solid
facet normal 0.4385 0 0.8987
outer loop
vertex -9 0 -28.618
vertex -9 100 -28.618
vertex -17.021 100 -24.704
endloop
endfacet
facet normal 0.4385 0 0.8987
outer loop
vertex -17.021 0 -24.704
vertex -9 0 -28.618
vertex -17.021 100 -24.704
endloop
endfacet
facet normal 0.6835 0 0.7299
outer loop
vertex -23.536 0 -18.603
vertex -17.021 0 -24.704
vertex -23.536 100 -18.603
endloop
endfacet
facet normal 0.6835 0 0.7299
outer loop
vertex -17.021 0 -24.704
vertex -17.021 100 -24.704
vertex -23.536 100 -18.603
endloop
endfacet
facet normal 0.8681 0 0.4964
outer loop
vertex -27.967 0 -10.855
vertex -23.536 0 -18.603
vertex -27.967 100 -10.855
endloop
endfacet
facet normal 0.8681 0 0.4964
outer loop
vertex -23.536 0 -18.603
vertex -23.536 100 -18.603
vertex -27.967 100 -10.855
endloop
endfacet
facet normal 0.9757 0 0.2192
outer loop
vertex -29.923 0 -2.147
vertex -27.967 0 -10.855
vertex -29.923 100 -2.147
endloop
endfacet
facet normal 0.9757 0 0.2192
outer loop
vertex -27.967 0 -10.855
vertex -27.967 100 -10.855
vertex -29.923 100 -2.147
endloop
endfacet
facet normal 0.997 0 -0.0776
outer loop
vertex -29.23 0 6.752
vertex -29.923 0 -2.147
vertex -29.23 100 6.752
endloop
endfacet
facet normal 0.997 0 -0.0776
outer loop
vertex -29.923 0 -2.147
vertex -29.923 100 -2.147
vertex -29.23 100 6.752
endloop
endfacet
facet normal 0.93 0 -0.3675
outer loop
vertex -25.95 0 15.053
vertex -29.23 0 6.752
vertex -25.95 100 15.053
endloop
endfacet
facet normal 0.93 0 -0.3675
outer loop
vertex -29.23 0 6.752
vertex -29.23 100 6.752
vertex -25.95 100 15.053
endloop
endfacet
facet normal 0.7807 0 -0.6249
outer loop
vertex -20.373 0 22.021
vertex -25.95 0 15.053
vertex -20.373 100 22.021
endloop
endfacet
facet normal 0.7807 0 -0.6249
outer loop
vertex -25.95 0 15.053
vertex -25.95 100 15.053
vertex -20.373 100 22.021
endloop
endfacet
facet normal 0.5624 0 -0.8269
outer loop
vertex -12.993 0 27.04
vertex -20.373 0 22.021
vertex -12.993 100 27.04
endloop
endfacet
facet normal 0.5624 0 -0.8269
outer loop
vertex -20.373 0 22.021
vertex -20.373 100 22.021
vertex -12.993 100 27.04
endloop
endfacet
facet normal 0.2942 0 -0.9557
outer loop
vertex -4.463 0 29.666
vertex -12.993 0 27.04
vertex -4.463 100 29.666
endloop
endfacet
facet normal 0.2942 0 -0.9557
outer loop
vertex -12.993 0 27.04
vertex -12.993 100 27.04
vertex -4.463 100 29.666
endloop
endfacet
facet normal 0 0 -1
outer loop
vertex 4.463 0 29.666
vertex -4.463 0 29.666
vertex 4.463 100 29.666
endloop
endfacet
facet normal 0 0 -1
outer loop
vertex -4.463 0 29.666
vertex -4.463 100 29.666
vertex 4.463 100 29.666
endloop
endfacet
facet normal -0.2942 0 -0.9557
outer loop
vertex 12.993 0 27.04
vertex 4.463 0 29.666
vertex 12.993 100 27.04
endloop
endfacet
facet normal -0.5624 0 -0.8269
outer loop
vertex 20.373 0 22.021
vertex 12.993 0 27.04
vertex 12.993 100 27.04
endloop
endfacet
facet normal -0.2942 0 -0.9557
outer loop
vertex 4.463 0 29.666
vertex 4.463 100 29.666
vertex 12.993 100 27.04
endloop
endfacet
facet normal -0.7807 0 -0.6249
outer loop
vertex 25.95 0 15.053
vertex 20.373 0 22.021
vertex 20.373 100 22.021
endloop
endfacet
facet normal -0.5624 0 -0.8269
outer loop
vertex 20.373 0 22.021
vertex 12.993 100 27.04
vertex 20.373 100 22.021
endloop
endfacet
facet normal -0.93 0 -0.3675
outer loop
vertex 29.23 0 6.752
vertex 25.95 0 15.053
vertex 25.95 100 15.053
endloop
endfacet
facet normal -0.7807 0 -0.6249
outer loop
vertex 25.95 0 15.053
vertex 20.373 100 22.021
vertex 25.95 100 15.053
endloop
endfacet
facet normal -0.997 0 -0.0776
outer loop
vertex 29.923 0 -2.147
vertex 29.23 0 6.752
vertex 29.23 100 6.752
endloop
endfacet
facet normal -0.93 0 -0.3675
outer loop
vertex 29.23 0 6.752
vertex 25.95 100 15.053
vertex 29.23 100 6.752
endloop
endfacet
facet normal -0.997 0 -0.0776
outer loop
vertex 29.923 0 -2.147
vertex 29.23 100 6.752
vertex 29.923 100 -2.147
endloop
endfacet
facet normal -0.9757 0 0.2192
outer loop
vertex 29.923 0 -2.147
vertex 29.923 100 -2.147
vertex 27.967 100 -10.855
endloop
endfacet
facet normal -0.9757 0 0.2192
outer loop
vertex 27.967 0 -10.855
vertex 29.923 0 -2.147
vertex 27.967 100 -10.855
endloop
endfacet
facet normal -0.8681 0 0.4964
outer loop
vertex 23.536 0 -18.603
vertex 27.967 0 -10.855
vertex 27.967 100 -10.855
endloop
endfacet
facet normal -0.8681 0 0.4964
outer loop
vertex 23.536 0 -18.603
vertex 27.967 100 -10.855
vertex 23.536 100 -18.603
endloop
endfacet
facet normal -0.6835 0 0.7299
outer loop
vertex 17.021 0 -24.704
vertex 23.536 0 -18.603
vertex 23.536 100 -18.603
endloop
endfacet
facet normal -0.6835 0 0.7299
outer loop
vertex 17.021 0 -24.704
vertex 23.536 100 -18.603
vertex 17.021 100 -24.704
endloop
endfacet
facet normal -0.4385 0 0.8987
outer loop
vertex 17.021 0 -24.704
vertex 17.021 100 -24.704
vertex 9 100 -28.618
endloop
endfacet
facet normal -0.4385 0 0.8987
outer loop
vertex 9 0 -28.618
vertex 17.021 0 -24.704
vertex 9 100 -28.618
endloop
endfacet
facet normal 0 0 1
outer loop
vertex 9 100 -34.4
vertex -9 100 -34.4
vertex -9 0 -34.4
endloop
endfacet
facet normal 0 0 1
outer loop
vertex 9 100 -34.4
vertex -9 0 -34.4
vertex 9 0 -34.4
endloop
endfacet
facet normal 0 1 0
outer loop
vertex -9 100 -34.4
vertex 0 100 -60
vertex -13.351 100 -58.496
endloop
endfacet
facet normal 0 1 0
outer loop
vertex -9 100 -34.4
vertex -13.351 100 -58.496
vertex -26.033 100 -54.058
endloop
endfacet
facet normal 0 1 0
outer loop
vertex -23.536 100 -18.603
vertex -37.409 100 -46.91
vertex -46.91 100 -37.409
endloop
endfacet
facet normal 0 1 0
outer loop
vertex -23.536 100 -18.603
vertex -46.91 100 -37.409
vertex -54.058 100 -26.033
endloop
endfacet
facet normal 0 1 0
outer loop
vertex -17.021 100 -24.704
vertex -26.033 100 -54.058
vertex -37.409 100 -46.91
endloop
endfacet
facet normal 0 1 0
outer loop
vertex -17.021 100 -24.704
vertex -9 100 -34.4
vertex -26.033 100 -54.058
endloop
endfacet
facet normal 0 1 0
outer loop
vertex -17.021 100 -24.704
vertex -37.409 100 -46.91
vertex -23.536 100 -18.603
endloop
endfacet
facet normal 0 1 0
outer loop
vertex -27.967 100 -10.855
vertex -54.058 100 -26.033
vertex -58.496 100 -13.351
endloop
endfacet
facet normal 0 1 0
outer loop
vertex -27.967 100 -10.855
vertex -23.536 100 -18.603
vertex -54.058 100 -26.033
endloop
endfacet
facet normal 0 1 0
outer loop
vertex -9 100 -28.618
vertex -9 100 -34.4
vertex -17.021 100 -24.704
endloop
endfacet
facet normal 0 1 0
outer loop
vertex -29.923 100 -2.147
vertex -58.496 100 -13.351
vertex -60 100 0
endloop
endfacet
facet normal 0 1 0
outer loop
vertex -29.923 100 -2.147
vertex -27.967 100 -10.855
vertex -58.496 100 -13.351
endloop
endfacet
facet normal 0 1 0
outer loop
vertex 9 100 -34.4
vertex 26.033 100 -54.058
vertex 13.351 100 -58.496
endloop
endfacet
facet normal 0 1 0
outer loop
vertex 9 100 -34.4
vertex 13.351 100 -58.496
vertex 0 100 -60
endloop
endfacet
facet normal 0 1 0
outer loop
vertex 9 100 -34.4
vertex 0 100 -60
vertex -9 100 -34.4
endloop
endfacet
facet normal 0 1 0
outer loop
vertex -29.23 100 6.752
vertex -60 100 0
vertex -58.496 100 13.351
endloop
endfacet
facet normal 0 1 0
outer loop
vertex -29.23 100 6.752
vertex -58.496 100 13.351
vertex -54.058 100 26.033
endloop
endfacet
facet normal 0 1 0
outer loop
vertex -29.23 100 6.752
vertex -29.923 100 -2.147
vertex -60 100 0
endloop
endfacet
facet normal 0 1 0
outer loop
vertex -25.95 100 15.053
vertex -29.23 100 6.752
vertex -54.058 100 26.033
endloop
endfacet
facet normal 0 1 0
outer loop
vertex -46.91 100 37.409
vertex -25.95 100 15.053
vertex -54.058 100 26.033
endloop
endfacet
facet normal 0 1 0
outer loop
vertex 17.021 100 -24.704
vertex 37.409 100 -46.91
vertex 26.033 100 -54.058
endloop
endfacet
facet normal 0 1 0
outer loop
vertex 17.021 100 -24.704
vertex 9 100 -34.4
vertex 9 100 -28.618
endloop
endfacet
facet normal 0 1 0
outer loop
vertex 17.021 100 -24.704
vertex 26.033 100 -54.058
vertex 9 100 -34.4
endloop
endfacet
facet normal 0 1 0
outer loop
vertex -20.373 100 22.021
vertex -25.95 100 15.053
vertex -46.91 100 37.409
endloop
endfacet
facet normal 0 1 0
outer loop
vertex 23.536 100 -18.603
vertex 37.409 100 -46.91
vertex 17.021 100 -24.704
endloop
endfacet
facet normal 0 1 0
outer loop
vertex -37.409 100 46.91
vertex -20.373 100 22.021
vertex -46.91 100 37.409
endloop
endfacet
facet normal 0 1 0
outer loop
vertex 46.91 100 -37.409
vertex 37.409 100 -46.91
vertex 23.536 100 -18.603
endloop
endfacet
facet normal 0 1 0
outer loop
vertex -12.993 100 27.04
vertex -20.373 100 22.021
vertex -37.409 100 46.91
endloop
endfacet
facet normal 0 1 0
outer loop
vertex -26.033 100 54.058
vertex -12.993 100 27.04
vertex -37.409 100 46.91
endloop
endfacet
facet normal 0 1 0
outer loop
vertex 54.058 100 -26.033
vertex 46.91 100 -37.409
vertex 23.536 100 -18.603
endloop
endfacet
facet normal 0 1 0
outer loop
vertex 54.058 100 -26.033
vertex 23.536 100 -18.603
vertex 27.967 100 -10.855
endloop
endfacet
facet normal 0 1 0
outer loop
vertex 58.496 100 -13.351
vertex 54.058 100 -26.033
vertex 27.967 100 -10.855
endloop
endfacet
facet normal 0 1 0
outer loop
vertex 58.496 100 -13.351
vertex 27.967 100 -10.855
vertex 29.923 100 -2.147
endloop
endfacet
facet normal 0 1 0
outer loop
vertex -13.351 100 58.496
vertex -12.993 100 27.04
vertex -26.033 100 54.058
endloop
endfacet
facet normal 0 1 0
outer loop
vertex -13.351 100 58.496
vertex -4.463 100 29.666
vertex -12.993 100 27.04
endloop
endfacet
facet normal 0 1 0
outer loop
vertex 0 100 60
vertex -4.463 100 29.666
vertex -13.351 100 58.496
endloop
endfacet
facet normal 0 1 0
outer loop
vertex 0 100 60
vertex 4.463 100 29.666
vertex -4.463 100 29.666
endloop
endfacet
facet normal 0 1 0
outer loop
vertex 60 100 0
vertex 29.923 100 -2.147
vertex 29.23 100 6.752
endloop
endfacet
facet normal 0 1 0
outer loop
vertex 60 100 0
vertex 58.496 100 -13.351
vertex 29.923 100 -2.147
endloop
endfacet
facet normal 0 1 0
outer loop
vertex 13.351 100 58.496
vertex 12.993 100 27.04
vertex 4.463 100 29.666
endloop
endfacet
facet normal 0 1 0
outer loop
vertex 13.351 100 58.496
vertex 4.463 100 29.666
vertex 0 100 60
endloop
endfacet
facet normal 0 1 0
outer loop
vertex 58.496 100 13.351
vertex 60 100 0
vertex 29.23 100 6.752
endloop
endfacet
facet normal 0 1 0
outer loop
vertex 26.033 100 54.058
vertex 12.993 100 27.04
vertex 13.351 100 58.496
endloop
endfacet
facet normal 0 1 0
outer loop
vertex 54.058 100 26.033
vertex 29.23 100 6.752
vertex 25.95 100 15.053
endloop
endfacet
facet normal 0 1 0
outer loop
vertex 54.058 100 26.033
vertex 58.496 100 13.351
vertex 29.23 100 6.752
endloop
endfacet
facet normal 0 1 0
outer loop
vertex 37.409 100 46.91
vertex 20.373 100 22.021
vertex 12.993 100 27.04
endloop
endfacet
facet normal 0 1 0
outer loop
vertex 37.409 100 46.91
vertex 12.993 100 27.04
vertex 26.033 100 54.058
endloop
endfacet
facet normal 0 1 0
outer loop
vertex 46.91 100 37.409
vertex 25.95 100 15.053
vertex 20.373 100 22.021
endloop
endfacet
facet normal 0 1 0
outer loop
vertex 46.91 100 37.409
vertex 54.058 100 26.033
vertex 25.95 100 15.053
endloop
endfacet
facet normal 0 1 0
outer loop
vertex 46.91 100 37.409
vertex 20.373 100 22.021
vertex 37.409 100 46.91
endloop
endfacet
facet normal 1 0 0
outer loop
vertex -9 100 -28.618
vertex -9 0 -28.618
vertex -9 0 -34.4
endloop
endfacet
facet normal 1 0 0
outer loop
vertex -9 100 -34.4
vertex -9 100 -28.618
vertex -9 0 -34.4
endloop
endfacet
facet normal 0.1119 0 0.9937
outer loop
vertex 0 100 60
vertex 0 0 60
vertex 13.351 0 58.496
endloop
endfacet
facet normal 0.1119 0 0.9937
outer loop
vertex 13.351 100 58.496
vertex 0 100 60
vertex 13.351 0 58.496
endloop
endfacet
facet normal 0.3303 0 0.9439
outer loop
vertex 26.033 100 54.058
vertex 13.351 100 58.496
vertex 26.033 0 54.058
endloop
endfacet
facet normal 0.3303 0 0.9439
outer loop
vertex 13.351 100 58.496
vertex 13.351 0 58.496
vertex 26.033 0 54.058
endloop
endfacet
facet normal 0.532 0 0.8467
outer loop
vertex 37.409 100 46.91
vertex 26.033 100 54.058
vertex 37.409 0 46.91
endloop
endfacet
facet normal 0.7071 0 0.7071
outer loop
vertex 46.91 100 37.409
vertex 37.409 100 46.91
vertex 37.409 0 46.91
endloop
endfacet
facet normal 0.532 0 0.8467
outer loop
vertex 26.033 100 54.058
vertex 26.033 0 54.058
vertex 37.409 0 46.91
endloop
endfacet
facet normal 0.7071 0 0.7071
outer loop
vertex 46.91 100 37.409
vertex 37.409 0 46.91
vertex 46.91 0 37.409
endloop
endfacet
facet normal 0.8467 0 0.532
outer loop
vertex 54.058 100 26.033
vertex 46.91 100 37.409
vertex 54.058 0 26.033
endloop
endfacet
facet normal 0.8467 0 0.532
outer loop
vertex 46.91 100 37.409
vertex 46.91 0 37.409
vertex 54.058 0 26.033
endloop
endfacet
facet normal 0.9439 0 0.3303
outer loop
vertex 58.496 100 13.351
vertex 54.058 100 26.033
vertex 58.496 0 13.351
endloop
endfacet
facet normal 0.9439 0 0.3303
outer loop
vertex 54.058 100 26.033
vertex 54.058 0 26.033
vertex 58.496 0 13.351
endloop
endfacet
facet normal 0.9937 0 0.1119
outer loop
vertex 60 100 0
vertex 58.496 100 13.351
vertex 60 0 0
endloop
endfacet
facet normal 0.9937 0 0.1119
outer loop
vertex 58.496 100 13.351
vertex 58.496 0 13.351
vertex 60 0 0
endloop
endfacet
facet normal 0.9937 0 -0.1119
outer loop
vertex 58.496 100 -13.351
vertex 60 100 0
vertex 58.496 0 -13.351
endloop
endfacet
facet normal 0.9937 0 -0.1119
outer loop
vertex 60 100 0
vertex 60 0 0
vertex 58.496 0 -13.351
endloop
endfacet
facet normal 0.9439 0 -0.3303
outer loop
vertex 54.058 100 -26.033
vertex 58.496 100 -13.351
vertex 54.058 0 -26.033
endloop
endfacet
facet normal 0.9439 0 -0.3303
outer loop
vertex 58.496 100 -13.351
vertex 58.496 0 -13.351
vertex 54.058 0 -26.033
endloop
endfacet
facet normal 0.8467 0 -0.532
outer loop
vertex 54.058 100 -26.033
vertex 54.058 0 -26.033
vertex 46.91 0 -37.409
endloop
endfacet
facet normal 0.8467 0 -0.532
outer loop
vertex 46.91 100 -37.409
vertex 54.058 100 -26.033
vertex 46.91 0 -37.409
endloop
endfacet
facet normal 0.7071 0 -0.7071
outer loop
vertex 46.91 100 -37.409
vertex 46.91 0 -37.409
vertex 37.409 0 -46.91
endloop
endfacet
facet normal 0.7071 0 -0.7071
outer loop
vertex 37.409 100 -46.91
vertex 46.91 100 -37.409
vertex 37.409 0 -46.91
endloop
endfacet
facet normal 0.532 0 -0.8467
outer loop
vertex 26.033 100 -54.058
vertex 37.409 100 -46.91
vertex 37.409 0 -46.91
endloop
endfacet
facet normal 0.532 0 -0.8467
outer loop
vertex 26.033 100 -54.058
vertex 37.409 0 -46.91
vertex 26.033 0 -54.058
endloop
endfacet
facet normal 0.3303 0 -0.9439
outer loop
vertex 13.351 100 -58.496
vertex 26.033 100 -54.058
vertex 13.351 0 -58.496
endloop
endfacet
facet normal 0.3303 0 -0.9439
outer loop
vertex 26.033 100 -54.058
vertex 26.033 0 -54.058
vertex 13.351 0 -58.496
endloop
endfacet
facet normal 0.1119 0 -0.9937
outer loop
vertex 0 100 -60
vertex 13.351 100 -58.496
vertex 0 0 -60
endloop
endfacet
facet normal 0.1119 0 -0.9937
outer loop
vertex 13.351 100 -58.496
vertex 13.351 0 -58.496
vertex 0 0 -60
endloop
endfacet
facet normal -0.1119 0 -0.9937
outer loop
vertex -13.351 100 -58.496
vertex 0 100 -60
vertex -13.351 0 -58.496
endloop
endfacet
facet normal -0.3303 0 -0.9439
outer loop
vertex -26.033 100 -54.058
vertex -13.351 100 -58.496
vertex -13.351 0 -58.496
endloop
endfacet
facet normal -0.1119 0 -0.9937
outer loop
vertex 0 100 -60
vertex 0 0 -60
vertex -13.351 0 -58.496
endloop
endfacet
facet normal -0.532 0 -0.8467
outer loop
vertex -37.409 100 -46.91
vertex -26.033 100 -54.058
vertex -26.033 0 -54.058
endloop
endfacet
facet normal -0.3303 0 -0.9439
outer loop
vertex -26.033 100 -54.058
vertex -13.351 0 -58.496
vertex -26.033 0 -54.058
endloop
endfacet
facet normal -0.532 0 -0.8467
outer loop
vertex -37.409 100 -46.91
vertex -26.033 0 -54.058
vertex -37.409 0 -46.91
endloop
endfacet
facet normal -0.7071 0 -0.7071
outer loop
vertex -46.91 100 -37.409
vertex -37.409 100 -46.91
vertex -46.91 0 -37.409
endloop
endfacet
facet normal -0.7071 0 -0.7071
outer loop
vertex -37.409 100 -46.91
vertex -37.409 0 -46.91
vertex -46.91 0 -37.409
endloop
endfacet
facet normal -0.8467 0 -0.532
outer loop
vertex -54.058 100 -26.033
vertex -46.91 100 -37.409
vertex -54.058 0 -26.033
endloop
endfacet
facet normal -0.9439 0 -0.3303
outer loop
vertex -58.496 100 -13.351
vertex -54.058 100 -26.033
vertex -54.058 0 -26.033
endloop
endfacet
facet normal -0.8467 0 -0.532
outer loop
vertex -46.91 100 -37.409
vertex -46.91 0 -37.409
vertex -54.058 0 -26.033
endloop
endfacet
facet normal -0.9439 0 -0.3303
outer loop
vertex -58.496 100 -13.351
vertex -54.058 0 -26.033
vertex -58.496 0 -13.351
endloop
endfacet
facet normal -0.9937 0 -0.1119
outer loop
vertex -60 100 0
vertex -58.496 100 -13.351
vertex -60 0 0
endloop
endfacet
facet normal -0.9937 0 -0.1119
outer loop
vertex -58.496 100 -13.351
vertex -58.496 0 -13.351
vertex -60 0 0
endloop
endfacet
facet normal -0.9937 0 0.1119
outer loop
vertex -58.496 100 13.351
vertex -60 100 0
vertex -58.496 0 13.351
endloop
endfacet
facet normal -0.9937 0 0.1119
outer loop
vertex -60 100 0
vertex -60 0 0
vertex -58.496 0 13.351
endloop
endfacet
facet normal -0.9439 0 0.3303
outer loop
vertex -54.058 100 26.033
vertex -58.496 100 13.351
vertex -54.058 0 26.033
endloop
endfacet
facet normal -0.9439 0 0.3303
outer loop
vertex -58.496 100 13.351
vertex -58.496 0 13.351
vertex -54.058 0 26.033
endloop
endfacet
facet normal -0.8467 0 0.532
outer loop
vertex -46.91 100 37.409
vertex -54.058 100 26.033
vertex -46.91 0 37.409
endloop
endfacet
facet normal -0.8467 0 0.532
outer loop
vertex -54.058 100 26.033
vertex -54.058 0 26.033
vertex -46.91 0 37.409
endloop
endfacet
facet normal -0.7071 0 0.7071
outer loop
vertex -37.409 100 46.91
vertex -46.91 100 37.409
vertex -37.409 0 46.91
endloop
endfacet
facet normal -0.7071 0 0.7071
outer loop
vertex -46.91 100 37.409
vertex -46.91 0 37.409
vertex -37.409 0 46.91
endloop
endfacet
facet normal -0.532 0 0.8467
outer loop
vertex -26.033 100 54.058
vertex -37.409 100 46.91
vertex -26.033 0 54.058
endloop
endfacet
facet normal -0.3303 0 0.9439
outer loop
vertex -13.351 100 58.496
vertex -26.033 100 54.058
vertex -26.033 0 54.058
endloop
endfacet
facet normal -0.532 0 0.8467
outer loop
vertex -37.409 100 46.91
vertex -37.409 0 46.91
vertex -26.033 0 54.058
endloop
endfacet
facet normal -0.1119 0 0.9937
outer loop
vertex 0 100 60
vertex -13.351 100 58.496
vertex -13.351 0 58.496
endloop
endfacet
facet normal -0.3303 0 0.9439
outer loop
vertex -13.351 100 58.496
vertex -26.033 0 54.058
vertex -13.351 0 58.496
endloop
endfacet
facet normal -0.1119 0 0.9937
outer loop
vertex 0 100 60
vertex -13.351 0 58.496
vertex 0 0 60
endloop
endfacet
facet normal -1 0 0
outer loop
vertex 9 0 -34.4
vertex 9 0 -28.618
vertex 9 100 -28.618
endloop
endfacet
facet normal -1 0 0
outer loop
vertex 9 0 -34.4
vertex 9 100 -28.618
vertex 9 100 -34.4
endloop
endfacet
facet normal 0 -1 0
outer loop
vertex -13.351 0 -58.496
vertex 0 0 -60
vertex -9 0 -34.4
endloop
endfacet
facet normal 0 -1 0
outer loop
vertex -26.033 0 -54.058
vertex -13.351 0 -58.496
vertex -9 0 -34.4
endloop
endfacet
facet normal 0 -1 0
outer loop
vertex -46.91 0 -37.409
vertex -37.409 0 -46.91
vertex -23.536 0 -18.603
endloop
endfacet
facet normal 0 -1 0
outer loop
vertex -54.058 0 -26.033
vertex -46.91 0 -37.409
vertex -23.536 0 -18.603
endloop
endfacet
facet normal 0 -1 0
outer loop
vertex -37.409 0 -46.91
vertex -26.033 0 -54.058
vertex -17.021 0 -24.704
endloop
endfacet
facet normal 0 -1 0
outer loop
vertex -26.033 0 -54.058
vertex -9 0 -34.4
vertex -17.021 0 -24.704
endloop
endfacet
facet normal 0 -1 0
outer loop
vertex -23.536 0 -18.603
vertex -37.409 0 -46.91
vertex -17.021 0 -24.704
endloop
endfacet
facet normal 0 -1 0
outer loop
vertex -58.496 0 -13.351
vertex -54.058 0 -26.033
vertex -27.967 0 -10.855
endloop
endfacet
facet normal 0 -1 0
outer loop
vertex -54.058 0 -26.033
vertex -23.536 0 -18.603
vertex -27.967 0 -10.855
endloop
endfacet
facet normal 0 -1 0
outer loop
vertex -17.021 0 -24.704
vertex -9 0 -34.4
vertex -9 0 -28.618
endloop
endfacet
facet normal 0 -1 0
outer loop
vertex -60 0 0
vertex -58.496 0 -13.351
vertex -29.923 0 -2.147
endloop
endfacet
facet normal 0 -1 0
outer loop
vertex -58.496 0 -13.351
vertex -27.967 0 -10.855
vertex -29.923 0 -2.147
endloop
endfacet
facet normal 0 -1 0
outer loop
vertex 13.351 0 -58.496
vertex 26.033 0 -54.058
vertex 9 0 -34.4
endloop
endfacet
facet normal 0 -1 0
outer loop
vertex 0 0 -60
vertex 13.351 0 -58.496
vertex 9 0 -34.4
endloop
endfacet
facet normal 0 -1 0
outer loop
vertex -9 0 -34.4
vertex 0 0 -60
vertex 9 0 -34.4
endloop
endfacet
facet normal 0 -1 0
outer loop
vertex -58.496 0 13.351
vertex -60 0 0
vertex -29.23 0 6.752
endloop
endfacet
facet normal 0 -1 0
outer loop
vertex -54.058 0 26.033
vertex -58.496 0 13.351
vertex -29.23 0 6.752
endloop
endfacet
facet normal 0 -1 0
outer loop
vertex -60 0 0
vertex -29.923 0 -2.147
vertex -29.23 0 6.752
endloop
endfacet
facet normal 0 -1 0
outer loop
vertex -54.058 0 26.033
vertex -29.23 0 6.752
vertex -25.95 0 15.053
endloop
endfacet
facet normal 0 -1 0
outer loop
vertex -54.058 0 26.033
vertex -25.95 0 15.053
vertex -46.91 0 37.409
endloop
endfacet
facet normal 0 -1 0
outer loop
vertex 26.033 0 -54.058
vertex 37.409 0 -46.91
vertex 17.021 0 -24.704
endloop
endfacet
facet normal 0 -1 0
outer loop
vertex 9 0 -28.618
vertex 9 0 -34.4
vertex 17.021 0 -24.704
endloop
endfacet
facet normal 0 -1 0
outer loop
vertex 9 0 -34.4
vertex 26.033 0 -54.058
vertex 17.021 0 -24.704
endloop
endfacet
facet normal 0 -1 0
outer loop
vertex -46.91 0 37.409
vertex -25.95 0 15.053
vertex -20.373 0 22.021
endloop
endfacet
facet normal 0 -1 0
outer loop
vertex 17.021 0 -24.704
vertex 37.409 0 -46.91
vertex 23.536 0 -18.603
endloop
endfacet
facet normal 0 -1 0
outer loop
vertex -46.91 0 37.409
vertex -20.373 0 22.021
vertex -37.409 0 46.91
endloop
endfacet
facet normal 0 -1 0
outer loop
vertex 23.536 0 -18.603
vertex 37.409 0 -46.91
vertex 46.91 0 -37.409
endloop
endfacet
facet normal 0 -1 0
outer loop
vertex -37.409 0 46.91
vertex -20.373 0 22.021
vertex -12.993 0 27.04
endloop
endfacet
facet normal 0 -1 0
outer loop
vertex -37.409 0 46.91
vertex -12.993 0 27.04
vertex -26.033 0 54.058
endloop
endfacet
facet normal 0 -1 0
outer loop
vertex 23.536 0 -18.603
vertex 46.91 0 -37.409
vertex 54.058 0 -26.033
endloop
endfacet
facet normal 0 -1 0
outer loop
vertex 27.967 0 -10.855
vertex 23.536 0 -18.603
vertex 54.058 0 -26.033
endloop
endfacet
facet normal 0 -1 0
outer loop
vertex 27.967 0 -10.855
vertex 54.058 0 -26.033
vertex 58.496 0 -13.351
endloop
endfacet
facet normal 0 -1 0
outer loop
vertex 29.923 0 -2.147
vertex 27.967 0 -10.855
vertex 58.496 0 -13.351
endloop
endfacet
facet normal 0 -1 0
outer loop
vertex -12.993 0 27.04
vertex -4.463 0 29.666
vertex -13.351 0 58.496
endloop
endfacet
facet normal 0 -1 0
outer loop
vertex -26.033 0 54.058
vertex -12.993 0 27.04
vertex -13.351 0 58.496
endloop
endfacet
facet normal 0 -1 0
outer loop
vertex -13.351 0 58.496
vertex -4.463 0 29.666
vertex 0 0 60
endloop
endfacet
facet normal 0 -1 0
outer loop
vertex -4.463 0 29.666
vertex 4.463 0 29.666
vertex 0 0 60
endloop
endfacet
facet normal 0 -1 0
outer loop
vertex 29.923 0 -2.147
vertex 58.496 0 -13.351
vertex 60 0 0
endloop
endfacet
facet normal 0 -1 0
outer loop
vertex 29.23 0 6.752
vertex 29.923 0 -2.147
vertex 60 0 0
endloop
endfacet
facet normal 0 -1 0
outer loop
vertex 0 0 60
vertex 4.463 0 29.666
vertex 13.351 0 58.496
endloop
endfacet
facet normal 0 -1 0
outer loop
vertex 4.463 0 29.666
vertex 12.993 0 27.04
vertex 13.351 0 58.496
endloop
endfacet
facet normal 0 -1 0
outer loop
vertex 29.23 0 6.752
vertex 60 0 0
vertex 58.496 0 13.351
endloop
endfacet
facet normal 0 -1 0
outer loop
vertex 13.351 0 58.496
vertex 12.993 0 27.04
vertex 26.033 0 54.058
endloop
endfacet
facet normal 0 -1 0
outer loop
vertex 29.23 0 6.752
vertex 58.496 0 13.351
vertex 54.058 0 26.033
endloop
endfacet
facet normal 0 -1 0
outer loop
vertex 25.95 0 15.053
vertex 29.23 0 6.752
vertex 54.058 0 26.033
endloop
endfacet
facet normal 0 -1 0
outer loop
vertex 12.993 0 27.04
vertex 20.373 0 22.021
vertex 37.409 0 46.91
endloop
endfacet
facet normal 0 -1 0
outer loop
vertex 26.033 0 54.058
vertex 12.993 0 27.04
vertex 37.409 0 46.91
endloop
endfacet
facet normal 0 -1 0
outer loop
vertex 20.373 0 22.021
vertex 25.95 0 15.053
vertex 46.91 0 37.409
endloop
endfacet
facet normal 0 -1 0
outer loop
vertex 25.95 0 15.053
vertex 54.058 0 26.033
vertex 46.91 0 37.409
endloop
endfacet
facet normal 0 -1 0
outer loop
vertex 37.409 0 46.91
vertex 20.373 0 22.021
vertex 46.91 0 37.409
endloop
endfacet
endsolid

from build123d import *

# Parameters (mm, degrees)
SKETCH2_R           = 60
BOSS_EXTRUDE1_DEPTH = 100
SKETCH3_R           = 30
CUT_EXTRUDE1_DEPTH  = 132.148770486
SKETCH4_W           = 18
SKETCH4_H           = 11
CUT_EXTRUDE2_DEPTH  = 132.148770486


with BuildPart() as part:
    # Sketch2 → Boss-Extrude1 (new body)
    with BuildSketch(Plane(origin=(0, 0, 0), x_dir=(1, 0, 0), z_dir=(0, 1, 0))):
        with Locations(Location((0, 0, 0), (0, 0, 270))):
            Circle(SKETCH2_R)
    extrude(amount=BOSS_EXTRUDE1_DEPTH)

    # Sketch3 → Cut-Extrude1 (cut, through all)
    with BuildSketch(Plane(origin=(0, 100, 0), x_dir=(1, 0, 0), z_dir=(0, 1, 0))):
        with Locations(Location((0, 0, 0), (0, 0, 270))):
            Circle(SKETCH3_R)
    extrude(amount=-CUT_EXTRUDE1_DEPTH, mode=Mode.SUBTRACT)

    # Sketch4 → Cut-Extrude2 (cut, through all)
    with BuildSketch(Plane(origin=(0, 100, 0), x_dir=(1, 0, 0), z_dir=(0, 1, 0))):
        with Locations((0, 28.9)):
            Rectangle(SKETCH4_W, SKETCH4_H)
    extrude(amount=-CUT_EXTRUDE2_DEPTH, mode=Mode.SUBTRACT)


solid = part.part
